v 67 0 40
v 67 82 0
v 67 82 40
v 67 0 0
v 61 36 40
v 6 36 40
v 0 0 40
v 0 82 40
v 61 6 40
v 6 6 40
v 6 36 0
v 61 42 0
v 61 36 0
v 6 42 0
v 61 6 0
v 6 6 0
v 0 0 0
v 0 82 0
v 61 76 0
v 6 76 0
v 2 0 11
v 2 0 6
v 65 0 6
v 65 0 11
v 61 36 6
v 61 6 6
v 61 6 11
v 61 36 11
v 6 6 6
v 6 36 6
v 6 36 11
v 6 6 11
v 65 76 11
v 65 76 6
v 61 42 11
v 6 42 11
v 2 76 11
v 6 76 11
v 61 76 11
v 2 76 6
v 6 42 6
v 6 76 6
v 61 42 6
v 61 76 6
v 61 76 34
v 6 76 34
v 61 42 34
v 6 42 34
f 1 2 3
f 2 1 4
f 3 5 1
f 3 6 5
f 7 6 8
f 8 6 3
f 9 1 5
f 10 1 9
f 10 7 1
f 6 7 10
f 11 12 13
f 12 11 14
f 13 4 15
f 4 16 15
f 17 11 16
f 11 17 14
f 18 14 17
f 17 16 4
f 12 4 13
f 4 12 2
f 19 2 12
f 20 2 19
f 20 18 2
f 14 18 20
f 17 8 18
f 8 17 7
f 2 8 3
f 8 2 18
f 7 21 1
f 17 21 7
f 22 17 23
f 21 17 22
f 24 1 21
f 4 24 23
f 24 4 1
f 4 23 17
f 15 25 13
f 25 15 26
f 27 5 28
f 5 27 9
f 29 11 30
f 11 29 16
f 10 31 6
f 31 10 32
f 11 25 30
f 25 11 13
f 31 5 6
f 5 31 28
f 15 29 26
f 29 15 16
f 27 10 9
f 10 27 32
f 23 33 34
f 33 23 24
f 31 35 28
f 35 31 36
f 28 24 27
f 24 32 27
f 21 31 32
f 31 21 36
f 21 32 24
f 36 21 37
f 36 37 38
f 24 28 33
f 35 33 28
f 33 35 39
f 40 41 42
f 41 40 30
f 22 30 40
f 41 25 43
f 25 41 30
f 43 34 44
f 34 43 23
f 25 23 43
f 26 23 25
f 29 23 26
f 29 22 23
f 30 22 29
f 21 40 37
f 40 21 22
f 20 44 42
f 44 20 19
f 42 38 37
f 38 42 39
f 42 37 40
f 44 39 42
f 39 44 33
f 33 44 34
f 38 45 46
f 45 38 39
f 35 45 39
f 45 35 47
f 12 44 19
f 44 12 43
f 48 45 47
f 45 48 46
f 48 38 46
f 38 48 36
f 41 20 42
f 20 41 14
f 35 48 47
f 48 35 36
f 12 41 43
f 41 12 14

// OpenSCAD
// file: config.scad
// UNIT = mm

wall=6;

soap=[55,30,100];
outer=[soap[0]+2*wall, soap[1]+40+2*wall, 40];

distance_screws=35;

///////////////////////////
// SLIDER STUFF          //
///////////////////////////

slider=[soap[0]+wall, outer[1]-wall, 3];
slider_extra_space=2; // x&y

dent_width=5;
dent_depth=5;
dent_height=1;

dent_alpha=30;
dent_beta=78;

dent_overlapp = 2;
dent_inter_space=5;
// main file
include <config.scad>;

difference() {
	cube(outer);

	// soap
	#translate([wall,wall,0]) cube(soap);

	// slider
	#translate([(outer[0]-slider[0]-slider_extra_space)/2,0,wall])
		cube([slider[0]+slider_extra_space, 
			slider[1], 
			slider[2]+slider_extra_space]);

	// back hole
	translate([wall, soap[1]+2*wall, 0])
		cube([soap[0],
			outer[1]-soap[1]-3*wall,
			outer[2]-wall]);
}
